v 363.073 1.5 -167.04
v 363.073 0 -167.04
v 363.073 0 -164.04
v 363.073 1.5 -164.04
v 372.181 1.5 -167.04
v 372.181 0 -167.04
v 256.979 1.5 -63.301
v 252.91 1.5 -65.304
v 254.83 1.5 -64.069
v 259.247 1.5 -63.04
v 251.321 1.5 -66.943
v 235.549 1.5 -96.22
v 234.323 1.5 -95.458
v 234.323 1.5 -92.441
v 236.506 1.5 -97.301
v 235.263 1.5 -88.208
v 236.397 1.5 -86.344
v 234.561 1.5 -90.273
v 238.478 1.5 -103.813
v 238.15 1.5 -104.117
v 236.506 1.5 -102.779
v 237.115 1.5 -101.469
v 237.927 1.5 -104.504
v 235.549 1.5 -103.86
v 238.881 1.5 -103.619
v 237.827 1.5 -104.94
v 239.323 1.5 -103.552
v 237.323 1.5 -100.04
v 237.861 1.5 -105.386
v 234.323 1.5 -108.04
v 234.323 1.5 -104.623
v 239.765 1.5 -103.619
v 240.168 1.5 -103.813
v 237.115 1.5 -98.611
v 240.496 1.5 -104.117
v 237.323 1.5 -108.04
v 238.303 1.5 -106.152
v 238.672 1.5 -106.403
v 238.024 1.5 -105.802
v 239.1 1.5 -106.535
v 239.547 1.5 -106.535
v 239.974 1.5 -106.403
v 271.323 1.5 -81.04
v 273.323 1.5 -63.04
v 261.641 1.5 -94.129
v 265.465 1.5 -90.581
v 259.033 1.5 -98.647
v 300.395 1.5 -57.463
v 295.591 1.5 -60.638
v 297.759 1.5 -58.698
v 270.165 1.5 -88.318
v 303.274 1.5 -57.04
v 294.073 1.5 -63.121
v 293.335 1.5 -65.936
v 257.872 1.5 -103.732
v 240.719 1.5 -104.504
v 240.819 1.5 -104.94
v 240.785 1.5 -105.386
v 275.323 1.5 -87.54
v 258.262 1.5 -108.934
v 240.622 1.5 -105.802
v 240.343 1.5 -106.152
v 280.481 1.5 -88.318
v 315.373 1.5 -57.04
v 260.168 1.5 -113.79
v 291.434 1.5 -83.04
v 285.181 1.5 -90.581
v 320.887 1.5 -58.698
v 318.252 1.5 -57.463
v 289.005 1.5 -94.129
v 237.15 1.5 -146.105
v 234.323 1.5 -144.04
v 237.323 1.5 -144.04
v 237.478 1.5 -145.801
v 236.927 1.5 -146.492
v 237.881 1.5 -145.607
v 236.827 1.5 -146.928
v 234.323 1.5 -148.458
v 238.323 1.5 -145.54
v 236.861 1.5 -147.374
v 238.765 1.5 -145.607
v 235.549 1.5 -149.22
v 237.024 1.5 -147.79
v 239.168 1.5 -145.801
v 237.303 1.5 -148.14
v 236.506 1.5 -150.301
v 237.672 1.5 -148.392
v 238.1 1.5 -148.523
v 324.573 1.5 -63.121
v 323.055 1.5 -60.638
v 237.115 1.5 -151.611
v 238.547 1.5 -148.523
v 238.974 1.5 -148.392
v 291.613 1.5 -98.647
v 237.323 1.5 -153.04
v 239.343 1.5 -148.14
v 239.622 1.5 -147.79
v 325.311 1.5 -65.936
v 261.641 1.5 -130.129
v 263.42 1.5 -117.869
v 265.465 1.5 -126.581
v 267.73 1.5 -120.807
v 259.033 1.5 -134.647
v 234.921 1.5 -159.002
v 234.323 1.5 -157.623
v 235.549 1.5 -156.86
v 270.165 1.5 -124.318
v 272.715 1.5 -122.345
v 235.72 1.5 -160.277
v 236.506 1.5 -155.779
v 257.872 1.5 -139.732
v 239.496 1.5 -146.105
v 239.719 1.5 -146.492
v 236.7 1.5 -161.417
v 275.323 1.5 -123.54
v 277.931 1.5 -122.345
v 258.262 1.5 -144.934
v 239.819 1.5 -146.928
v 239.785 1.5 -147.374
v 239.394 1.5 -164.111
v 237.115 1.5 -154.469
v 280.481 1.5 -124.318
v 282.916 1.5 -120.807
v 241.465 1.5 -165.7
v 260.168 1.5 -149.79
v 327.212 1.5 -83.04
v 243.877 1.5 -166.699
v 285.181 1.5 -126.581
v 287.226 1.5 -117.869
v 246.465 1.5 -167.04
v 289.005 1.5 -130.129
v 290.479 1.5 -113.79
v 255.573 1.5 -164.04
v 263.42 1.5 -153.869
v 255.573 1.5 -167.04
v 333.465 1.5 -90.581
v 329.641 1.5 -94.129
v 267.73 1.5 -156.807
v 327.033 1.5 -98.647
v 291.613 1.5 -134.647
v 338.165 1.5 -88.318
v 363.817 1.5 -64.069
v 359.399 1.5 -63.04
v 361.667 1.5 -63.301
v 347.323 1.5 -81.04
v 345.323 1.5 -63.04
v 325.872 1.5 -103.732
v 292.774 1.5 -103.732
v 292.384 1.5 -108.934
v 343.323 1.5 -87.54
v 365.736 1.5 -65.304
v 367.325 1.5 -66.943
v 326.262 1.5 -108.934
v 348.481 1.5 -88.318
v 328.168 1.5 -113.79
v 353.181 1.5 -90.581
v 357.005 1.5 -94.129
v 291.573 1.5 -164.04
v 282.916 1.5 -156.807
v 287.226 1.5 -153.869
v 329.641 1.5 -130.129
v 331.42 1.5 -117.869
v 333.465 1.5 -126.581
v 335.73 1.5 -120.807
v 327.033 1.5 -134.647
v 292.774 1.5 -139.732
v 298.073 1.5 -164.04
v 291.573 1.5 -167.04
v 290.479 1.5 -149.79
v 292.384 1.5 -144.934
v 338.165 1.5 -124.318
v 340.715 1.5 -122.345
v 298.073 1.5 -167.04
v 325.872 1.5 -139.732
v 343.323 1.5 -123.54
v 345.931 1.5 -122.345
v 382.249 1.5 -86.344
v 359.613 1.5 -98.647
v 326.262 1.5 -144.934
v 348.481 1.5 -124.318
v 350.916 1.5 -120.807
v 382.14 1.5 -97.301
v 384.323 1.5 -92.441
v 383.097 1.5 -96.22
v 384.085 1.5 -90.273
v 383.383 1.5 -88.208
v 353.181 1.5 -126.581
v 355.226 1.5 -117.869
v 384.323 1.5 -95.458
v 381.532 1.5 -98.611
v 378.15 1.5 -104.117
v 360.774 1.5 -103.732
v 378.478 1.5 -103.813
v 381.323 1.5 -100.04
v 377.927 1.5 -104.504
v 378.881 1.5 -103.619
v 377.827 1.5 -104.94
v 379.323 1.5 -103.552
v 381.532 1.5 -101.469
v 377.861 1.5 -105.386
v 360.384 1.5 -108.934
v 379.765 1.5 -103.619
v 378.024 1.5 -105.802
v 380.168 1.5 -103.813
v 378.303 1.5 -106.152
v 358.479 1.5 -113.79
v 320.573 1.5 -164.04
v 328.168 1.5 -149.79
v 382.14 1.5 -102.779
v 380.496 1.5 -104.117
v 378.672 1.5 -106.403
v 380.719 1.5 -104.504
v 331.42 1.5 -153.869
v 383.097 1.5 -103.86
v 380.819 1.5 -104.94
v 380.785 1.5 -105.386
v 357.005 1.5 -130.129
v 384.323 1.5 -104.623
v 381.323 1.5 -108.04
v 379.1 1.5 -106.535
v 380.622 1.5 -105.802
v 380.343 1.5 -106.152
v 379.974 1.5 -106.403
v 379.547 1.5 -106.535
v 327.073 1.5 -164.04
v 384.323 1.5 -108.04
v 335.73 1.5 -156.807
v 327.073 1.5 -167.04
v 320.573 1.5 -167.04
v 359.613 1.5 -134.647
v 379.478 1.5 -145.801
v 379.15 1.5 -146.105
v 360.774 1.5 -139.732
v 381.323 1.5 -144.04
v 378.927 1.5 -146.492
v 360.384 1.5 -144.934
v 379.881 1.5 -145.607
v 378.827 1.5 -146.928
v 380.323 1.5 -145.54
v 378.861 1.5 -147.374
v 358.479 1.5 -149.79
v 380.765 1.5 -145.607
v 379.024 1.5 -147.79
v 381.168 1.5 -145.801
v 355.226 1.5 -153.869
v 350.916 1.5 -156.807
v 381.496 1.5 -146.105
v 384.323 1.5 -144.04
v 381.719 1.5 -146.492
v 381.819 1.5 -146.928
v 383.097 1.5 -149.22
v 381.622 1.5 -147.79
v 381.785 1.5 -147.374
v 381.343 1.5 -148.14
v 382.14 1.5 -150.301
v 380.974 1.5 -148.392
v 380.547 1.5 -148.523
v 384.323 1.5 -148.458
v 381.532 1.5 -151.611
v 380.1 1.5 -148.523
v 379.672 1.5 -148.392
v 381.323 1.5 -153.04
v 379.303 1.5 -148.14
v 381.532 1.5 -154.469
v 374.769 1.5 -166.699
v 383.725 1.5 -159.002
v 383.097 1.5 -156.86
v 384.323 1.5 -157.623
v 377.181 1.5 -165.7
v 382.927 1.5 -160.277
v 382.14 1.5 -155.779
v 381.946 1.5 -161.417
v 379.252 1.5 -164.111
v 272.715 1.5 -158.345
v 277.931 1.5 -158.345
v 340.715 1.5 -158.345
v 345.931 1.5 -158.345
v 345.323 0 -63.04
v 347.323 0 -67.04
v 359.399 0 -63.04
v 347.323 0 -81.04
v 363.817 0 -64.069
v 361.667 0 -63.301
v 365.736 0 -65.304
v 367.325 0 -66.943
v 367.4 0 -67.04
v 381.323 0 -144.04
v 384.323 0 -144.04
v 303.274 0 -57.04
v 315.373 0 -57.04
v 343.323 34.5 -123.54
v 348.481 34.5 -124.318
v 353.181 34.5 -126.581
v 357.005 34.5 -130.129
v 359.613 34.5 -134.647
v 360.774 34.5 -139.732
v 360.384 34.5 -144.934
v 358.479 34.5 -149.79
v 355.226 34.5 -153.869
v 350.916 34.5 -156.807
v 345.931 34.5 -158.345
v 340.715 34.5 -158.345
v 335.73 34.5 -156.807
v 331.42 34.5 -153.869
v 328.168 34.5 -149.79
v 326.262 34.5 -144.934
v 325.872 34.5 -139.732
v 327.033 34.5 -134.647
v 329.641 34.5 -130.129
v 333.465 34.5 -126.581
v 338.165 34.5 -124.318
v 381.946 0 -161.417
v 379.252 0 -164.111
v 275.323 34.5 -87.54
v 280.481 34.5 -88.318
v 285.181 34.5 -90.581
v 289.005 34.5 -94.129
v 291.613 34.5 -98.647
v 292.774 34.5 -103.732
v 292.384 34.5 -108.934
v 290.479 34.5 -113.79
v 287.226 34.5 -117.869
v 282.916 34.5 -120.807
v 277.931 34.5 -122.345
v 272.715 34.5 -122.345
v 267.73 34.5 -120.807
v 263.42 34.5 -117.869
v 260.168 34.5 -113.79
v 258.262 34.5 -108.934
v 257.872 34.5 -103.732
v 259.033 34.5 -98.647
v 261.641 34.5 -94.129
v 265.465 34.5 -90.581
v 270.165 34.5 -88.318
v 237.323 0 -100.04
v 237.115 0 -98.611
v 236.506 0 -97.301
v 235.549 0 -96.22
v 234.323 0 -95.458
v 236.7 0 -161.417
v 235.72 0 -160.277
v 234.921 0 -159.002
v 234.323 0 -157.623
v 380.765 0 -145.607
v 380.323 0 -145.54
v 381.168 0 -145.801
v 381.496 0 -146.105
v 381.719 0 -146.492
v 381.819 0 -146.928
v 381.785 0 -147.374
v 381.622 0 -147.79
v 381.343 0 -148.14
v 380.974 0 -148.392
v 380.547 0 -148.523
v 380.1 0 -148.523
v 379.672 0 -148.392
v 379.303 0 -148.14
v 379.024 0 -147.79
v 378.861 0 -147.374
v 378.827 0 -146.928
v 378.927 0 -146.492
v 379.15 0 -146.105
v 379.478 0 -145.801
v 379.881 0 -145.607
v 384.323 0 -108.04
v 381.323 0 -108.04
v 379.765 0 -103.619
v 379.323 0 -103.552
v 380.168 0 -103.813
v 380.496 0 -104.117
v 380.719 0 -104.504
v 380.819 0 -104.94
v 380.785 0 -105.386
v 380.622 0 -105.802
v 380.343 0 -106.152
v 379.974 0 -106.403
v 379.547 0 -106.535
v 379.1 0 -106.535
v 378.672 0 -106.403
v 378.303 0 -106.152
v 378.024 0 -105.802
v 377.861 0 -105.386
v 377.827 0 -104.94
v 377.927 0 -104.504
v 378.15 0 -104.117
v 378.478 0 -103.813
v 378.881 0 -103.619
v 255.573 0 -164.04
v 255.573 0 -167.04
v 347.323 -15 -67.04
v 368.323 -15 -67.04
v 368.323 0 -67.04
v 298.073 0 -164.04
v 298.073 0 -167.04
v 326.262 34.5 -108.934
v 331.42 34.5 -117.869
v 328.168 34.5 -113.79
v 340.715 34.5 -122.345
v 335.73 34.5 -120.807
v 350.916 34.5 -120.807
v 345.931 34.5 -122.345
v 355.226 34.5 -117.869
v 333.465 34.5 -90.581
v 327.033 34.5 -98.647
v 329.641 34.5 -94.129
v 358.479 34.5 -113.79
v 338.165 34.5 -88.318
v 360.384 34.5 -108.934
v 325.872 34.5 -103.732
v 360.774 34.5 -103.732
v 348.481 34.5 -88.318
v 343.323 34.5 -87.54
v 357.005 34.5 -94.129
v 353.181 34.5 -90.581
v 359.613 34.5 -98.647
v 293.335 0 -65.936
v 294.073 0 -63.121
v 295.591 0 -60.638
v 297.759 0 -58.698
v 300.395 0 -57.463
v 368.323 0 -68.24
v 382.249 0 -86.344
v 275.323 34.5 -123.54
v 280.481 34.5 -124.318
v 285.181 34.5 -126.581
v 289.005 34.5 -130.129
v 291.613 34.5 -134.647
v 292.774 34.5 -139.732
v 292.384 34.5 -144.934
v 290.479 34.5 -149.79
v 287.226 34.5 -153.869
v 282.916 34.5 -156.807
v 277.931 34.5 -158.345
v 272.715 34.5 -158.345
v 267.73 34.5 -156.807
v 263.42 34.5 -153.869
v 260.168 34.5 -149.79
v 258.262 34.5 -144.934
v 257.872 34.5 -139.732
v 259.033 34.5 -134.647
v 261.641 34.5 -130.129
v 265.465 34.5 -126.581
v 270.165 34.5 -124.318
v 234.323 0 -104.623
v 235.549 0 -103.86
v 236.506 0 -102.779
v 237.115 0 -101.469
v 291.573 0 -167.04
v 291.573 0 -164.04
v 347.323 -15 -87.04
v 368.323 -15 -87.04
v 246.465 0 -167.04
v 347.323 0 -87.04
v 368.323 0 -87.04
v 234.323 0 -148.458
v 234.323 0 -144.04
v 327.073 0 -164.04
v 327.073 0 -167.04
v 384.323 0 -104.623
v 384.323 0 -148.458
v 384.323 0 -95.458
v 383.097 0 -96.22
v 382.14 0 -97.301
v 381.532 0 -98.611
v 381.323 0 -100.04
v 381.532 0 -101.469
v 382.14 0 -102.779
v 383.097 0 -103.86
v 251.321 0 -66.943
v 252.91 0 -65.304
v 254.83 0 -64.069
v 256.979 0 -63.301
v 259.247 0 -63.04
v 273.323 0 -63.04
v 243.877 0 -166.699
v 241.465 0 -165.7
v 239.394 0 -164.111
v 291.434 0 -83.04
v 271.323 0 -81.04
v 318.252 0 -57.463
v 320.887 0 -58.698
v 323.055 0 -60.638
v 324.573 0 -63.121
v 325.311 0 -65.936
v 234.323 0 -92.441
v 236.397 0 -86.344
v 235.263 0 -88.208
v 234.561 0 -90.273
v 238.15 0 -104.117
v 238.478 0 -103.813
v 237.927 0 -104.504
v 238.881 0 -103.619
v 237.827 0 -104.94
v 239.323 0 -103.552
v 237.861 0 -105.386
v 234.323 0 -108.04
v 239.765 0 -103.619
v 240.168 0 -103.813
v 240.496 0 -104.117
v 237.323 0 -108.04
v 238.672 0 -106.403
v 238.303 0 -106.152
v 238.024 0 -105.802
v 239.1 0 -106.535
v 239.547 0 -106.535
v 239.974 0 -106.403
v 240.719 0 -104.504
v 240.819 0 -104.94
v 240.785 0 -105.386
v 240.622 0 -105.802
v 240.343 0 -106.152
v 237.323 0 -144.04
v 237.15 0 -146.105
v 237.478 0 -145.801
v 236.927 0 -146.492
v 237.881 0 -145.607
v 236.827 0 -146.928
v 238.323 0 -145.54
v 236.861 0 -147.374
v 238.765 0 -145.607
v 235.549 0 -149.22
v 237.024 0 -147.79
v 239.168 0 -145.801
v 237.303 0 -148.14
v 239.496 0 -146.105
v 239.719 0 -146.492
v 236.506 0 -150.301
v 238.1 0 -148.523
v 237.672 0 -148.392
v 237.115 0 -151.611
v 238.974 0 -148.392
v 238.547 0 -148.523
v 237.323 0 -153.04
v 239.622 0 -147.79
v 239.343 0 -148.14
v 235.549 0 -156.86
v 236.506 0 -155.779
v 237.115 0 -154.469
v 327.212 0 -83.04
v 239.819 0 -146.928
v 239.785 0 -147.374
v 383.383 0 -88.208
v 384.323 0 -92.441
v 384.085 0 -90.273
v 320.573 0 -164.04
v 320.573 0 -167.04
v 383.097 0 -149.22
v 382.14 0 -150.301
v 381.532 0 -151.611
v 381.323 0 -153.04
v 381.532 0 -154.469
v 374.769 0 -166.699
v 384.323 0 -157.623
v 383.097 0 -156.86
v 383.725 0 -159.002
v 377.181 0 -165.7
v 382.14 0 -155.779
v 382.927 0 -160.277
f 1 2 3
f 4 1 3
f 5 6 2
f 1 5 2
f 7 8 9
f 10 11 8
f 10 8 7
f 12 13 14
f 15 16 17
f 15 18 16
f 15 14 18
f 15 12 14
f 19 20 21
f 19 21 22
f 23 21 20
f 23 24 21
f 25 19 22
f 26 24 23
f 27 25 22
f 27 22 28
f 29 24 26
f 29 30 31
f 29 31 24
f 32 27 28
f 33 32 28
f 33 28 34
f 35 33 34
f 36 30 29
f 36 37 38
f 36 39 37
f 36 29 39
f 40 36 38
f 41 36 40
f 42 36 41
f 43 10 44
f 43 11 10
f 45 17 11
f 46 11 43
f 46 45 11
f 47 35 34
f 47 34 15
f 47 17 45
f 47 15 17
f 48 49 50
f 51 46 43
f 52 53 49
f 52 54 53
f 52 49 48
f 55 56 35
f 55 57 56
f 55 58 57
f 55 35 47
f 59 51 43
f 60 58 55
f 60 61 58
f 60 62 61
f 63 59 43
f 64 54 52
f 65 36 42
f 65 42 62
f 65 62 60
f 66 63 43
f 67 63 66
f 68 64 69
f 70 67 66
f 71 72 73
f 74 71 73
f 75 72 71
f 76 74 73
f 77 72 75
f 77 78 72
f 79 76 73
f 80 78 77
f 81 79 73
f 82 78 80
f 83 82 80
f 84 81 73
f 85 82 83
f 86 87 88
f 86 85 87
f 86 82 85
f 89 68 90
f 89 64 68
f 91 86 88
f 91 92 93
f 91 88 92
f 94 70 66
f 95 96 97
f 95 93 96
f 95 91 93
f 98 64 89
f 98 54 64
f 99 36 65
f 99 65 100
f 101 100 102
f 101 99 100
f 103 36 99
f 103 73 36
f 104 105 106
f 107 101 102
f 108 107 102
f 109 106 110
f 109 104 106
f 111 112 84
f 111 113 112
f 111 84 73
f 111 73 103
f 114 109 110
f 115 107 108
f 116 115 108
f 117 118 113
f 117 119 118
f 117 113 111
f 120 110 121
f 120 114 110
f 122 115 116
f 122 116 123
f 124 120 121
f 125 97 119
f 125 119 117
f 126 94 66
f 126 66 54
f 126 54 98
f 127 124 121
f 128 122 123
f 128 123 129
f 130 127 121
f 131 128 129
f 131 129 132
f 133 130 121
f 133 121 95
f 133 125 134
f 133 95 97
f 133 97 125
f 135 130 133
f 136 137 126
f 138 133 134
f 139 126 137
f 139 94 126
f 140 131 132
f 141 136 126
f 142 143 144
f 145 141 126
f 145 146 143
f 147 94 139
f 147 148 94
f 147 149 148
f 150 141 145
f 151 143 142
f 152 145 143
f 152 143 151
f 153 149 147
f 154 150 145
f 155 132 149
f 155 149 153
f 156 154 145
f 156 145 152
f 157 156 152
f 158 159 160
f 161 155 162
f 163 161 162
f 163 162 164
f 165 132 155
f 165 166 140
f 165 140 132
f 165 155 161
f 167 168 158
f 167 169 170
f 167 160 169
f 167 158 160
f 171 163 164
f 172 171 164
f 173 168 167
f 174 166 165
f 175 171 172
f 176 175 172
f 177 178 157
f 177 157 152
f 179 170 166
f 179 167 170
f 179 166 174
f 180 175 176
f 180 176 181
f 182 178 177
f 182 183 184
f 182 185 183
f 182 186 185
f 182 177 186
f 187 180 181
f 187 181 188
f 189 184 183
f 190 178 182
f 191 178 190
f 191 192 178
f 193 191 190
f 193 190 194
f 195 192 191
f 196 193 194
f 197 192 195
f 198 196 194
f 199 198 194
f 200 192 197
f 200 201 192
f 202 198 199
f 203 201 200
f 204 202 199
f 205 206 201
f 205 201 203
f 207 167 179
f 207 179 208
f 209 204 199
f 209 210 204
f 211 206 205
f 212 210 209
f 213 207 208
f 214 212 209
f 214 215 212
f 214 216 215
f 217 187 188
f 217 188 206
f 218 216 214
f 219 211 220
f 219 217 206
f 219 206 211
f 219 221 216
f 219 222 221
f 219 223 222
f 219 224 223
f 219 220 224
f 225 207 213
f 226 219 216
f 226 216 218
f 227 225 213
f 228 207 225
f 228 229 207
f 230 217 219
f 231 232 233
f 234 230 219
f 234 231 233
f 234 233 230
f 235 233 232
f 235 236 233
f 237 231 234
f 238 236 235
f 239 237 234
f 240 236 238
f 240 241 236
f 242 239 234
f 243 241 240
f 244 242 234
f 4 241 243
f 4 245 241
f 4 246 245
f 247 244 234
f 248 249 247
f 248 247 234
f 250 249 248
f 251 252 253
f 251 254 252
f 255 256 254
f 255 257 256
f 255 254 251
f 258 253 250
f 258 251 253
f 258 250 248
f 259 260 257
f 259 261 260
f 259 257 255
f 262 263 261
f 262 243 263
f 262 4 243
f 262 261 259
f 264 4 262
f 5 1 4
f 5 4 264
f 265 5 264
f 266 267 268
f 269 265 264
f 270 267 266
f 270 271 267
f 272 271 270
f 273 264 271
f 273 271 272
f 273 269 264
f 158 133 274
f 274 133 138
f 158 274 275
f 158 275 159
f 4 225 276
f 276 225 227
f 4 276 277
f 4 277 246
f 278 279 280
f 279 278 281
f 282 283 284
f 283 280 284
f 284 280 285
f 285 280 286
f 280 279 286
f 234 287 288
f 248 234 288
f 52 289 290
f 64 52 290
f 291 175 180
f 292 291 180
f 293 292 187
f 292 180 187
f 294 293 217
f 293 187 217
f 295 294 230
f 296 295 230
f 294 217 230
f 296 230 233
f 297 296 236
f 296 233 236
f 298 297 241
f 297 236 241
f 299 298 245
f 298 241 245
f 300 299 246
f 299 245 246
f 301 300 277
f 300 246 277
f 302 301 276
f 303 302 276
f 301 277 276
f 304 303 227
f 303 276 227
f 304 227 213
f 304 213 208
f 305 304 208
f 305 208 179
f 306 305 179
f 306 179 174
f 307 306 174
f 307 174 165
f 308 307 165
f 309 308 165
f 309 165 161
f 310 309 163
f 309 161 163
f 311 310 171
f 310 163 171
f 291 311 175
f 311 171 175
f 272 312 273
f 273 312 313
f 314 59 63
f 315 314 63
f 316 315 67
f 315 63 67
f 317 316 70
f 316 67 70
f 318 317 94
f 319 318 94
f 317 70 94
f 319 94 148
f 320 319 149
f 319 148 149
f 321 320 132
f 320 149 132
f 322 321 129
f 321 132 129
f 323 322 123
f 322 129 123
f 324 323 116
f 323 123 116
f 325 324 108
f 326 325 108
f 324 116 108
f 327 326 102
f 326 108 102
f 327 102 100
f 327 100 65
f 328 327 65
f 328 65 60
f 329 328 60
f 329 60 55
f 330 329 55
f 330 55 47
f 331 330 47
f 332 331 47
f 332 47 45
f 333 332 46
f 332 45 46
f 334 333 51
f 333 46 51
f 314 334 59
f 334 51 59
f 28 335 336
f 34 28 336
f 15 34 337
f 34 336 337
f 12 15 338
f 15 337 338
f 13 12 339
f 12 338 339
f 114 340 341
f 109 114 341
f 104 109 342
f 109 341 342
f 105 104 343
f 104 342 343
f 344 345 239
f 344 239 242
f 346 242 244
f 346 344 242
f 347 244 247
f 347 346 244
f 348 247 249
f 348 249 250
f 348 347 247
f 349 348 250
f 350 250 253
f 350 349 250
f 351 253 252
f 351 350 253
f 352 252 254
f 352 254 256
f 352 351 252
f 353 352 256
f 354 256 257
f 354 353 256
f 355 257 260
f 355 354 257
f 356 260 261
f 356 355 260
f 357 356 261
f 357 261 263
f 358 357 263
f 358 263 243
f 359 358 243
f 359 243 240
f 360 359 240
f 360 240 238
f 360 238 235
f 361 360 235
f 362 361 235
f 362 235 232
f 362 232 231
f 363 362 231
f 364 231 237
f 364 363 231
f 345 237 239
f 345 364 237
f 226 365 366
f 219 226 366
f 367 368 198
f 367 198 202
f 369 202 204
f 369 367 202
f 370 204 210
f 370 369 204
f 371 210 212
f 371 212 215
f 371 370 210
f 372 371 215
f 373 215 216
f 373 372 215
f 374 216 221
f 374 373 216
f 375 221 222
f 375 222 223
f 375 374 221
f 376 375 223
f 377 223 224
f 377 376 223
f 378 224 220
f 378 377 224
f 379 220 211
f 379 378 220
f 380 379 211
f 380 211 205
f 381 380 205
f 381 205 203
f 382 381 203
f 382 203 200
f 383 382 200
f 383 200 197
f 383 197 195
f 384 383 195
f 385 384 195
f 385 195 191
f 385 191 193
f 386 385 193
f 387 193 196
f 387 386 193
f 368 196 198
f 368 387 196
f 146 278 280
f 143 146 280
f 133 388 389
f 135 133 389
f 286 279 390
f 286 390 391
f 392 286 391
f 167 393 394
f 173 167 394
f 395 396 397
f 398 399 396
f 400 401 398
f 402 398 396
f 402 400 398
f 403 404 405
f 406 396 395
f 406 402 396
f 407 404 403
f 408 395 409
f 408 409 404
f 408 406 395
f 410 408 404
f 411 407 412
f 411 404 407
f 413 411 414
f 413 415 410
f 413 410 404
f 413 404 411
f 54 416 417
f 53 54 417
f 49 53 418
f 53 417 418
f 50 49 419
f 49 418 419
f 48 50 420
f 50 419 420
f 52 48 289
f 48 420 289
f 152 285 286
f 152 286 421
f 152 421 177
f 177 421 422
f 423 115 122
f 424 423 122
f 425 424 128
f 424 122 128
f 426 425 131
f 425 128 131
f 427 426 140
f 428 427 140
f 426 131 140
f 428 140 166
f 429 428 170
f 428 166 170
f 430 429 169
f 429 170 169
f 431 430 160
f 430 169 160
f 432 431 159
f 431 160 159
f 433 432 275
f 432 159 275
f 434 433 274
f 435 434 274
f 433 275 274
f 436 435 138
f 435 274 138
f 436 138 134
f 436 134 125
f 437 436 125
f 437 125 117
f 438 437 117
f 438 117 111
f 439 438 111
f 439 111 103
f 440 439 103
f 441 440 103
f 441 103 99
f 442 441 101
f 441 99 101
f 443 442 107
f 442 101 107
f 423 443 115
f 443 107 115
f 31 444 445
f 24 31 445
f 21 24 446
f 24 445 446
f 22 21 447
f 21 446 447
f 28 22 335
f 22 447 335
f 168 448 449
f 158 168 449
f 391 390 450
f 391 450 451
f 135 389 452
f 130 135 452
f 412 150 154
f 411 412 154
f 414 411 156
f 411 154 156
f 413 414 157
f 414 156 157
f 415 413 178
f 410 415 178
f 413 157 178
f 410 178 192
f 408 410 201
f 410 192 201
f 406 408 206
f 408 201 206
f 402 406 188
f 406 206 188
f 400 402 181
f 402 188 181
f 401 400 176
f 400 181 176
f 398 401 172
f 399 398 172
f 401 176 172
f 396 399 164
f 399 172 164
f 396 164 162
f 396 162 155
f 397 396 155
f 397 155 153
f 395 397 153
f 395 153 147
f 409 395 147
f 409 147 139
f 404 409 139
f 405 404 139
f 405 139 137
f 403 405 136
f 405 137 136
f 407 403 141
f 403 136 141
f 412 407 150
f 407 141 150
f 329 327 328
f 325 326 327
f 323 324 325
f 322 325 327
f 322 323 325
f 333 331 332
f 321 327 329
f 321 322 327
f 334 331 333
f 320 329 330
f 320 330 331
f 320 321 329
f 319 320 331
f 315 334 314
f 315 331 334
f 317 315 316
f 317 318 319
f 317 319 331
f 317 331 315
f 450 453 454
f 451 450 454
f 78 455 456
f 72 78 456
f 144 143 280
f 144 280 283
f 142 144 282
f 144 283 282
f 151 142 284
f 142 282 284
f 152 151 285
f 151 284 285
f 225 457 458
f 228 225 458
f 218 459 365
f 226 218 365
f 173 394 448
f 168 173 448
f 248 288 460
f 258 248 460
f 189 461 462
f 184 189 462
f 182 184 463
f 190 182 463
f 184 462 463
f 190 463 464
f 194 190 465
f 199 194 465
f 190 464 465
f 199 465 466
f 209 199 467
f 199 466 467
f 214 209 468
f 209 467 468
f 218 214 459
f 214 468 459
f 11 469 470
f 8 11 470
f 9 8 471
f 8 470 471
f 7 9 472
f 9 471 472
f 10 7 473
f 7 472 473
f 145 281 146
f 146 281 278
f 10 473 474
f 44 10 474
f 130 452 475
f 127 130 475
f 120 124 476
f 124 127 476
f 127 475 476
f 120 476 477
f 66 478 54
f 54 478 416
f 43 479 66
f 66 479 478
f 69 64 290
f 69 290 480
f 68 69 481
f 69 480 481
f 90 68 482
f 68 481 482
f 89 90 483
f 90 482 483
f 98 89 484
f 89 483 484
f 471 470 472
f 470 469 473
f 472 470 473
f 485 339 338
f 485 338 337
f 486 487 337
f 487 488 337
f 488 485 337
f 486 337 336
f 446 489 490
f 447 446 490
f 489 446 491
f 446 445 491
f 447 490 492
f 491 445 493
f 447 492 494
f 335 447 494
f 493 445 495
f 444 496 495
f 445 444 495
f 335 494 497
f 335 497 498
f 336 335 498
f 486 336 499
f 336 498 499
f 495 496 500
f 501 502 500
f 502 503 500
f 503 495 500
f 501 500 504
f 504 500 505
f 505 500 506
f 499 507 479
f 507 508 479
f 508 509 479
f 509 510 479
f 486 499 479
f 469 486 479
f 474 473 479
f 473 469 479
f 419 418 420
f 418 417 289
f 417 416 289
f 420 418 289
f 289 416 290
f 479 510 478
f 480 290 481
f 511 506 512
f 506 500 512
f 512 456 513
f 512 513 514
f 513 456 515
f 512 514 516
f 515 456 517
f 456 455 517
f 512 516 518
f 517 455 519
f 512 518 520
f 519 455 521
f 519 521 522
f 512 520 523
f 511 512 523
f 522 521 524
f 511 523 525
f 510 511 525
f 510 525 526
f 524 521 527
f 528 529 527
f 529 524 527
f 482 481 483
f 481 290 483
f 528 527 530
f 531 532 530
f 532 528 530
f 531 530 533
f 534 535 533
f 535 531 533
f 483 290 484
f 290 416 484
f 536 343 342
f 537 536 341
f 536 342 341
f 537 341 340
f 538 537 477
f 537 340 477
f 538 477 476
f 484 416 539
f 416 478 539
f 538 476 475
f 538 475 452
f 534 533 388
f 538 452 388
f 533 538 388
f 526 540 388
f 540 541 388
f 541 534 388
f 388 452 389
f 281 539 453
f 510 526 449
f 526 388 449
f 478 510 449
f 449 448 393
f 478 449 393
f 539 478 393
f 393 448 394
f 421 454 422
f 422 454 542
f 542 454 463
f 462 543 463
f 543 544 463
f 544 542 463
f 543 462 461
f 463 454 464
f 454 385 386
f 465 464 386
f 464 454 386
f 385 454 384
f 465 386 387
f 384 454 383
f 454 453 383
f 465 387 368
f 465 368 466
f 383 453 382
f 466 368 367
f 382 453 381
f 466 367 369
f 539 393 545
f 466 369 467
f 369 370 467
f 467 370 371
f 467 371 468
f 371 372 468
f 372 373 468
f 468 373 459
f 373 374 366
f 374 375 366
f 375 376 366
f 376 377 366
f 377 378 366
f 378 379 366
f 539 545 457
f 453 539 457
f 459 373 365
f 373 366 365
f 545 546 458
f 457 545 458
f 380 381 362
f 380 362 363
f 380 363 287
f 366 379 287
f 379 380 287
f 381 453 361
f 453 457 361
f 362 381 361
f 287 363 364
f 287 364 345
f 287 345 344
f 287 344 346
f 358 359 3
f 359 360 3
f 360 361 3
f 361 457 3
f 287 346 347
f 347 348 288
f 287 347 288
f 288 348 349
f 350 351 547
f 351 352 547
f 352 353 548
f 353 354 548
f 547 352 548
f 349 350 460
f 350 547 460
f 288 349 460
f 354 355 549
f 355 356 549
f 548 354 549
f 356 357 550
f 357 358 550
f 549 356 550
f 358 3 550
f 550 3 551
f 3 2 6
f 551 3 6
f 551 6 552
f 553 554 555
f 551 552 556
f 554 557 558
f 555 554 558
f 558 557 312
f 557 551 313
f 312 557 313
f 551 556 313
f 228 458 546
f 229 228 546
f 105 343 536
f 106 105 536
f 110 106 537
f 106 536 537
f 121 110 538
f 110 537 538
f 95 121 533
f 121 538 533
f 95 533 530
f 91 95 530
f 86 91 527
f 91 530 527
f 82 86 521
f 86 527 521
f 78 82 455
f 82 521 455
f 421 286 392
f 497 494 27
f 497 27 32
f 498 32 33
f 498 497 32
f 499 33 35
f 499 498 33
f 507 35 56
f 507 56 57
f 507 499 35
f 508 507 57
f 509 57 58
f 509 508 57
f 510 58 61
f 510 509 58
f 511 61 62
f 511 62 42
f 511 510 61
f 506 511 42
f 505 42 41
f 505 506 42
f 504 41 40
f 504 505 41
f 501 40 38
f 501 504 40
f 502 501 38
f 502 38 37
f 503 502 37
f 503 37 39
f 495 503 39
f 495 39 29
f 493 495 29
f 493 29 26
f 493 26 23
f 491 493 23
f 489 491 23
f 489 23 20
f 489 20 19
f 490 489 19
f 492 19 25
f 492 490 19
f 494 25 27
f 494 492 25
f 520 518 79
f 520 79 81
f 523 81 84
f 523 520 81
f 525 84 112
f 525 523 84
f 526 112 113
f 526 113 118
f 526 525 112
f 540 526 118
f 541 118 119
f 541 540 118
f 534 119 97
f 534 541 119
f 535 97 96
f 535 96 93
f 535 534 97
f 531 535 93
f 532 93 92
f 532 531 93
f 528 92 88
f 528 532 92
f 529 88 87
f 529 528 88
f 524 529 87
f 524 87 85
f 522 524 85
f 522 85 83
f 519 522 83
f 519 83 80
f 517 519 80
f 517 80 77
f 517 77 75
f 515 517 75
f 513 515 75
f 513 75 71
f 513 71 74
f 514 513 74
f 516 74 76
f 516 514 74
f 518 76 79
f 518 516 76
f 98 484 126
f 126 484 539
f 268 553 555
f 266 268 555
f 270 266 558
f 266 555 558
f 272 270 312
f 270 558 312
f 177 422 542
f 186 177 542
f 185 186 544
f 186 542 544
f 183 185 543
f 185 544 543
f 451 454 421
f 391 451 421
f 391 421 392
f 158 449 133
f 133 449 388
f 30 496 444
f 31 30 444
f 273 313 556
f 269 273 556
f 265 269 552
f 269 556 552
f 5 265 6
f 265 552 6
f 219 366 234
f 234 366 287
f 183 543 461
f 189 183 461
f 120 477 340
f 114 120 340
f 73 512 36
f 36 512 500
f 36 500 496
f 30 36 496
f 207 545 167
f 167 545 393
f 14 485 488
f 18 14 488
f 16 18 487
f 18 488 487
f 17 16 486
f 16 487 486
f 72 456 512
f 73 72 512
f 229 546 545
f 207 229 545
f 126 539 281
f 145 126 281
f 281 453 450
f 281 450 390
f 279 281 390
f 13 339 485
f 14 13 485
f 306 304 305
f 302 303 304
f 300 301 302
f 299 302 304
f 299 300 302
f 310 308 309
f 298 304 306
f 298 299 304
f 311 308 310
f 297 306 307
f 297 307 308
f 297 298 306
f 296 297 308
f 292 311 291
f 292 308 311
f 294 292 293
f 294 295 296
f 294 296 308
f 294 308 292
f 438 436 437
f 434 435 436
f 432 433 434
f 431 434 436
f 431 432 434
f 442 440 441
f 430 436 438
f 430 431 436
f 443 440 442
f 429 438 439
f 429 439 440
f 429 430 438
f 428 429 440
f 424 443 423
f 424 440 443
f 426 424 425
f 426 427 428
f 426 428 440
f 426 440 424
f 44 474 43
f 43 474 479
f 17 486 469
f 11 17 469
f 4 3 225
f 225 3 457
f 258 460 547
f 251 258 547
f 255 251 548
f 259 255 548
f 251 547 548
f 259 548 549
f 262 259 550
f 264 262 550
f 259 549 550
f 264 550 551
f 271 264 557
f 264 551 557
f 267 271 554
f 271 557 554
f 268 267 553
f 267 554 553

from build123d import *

# Parameters (mm, degrees)
SKETCH_2_R      = 1.5
EXTRUDE_1_DEPTH = 1.5
SKETCH_3_R      = 17.5
EXTRUDE_2_DEPTH = 33
SKETCH_4_W      = 21
SKETCH_4_H      = 20
EXTRUDE_3_DEPTH = 15
FILLET_1_R      = 10


with BuildPart() as part:
    # 草图2 → 凸台-拉伸1 (new body)
    with BuildSketch(Plane(origin=(0, 0, 0), x_dir=(1, 0, 0), z_dir=(0, 1, 0))):
        with BuildLine():
            Line((255.573084798, 167.040097328), (242.323084798, 167.040097328))
            Line((242.323084798, 167.040097328), (234.323084798, 159.040097328))
            Line((234.323084798, 159.040097328), (234.323084798, 157.622673023))
            ThreePointArc((234.323084798, 157.622673023), (236.506384931, 155.778710115), (237.323084798, 153.040097328))
            ThreePointArc((237.323084798, 153.040097328), (236.506384931, 150.30148454), (234.323084798, 148.457521633))
            Line((234.323084798, 148.457521633), (234.323084798, 144.040097328))
            Line((234.323084798, 144.040097328), (237.323084798, 144.040097328))
            Line((237.323084798, 144.040097328), (237.323084798, 108.040097328))
            Line((237.323084798, 108.040097328), (234.323084798, 108.040097328))
            Line((234.323084798, 108.040097328), (234.323084798, 104.622673023))
            ThreePointArc((234.323084798, 104.622673023), (236.506384931, 102.778710115), (237.323084798, 100.040097328))
            ThreePointArc((237.323084798, 100.040097328), (236.506384931, 97.30148454), (234.323084798, 95.457521633))
            Line((234.323084798, 95.457521633), (234.323084798, 89.040097328))
            Line((234.323084798, 89.040097328), (254.323084798, 63.040097328))
            Line((254.323084798, 63.040097328), (273.323084798, 63.040097328))
            Line((273.323084798, 63.040097328), (271.323084798, 81.040097328))
            Line((271.323084798, 81.040097328), (291.434195909, 83.040097328))
            Line((291.434195909, 83.040097328), (294.323084798, 57.040097328))
            Line((294.323084798, 57.040097328), (324.323084798, 57.040097328))
            Line((324.323084798, 57.040097328), (327.211973687, 83.040097328))
            Line((327.211973687, 83.040097328), (347.323084798, 81.040097328))
            Line((347.323084798, 81.040097328), (345.323084798, 63.040097328))
            Line((345.323084798, 63.040097328), (364.323084798, 63.040097328))
            Line((364.323084798, 63.040097328), (384.323084798, 89.040097328))
            Line((384.323084798, 89.040097328), (384.323084798, 95.457521633))
            ThreePointArc((384.323084798, 95.457521633), (381.323084798, 100.040097328), (384.323084798, 104.622673023))
            Line((384.323084798, 104.622673023), (384.323084798, 108.040097328))
            Line((384.323084798, 108.040097328), (381.323084798, 108.040097328))
            Line((381.323084798, 108.040097328), (381.323084798, 144.040097328))
            Line((381.323084798, 144.040097328), (384.323084798, 144.040097328))
            Line((384.323084798, 144.040097328), (384.323084798, 148.457521633))
            ThreePointArc((384.323084798, 148.457521633), (381.323084798, 153.040097328), (384.323084798, 157.622673023))
            Line((384.323084798, 157.622673023), (384.323084798, 159.040097328))
            Line((384.323084798, 159.040097328), (376.323084798, 167.040097328))
            Line((376.323084798, 167.040097328), (363.073084798, 167.040097328))
            Line((363.073084798, 167.040097328), (363.073084798, 164.040097328))
            Line((363.073084798, 164.040097328), (327.073084798, 164.040097328))
            Line((327.073084798, 164.040097328), (327.073084798, 167.040097328))
            Line((327.073084798, 167.040097328), (320.573084798, 167.040097328))
            Line((320.573084798, 167.040097328), (320.573084798, 164.040097328))
            Line((320.573084798, 164.040097328), (298.073084798, 164.040097328))
            Line((298.073084798, 164.040097328), (298.073084798, 167.040097328))
            Line((298.073084798, 167.040097328), (291.573084798, 167.040097328))
            Line((291.573084798, 167.040097328), (291.573084798, 164.040097328))
            Line((291.573084798, 164.040097328), (255.573084798, 164.040097328))
            Line((255.573084798, 164.040097328), (255.573084798, 167.040097328))
        make_face()
        with Locations(Location((239.323084798, 105.052003777, 0), (0, 0, 270))):
            Circle(SKETCH_2_R, mode=Mode.SUBTRACT)
        with Locations(Location((379.323084798, 105.052003777, 0), (0, 0, 270))):
            Circle(SKETCH_2_R, mode=Mode.SUBTRACT)
        with Locations(Location((238.323084798, 147.040097328, 0), (0, 0, 270))):
            Circle(SKETCH_2_R, mode=Mode.SUBTRACT)
        with Locations(Location((380.323084798, 147.040097328, 0), (0, 0, 270))):
            Circle(SKETCH_2_R, mode=Mode.SUBTRACT)
    extrude(amount=EXTRUDE_1_DEPTH)

    # 草图3 → 凸台-拉伸2 (add)
    with BuildSketch(Plane(origin=(0, 1.5, 0), x_dir=(1, 0, 0), z_dir=(0, 1, 0))):
        with Locations(Location((275.323084798, 141.040097328, 0), (0, 0, 270))):
            Circle(SKETCH_3_R)
        with Locations(Location((343.323084798, 141.040097328, 0), (0, 0, 270))):
            Circle(SKETCH_3_R)
        with Locations(Location((275.323084798, 105.040097328, 0), (0, 0, 270))):
            Circle(SKETCH_3_R)
        with Locations(Location((343.323084798, 105.040097328, 0), (0, 0, 270))):
            Circle(SKETCH_3_R)
    extrude(amount=EXTRUDE_2_DEPTH)

    # 草图4 → 凸台-拉伸3 (add)
    with BuildSketch(Plane.XZ):
        with Locations((357.823084798, -77.040097328)):
            Rectangle(SKETCH_4_W, SKETCH_4_H)
    extrude(amount=EXTRUDE_3_DEPTH)

    # 圆角1
    # the kernel refuses this fillet: 10 mm, written as the material it takes off along each edge
    with BuildSketch(Plane(origin=(234.323084798, -8.403282896, -159.040097328), x_dir=(0, 0, 1), z_dir=(0, 1, 0))) as fillet_1_piece_1:
        with BuildLine():
            CenterArc((4.694260484, 9.44787514), FILLET_1_R, 225, 25.871759313)
            Line((-2.376807328, 2.376807328), (-2.518228684, 2.235385972))
            Line((-2.518228684, 2.235385972), (-0.141421356, -0.141421356))
            Line((-0.141421356, -0.141421356), (0, -0.2))
            ThreePointArc((0, -0.2), (0.708712153, -0.2), (1.351887581, -0.188957503))
            Line((1.351887581, -0.188957503), (1.417424305, 0))
        make_face()
    extrude(amount=18.306565791, mode=Mode.SUBTRACT)
    with BuildSketch(Plane(origin=(242.323084798, -10.355339059, -167.040097328), x_dir=(-0.7071067811865476, 0, 0.7071067811865476), z_dir=(0, 1, 0)), Plane(origin=(376.323084798, -10.355339059, -167.040097328), x_dir=(-1, 0, 0), z_dir=(0, 1, 0))) as fillet_1_piece_2:
        with BuildLine():
            CenterArc((FILLET_1_R * 0.414213562373, FILLET_1_R), FILLET_1_R, 225, 45)
            Line((-FILLET_1_R * 0.292893218813, FILLET_1_R * 0.292893218813), (-FILLET_1_R * 0.307035354437, FILLET_1_R * 0.27875108319))
            Line((-FILLET_1_R * 0.307035354437, FILLET_1_R * 0.27875108319), (-FILLET_1_R * 0.00828427124746, -FILLET_1_R * 0.02))
            Line((-FILLET_1_R * 0.00828427124746, -FILLET_1_R * 0.02), (FILLET_1_R * 0.414213562373, -FILLET_1_R * 0.02))
            Line((FILLET_1_R * 0.414213562373, -FILLET_1_R * 0.02), (FILLET_1_R * 0.414213562373, 0))
        make_face()
    extrude(amount=22.210678119, mode=Mode.SUBTRACT)
    with BuildSketch(Plane(origin=(384.323084798, -8.403282896, -159.040097328), x_dir=(-0.7071067811865475, 0, -0.7071067811865475), z_dir=(0, 1, 0))) as fillet_1_piece_3:
        with BuildLine():
            CenterArc((3.361313158, 10), FILLET_1_R, 244.128240687, 25.871759313)
            Line((-1.002270338, 1.002270338), (-1.089542008, 0.822315745))
            ThreePointArc((-1.089542008, 0.822315745), (-0.642556525, 0.359713813), (-0.141421356, -0.141421356))
            Line((-0.141421356, -0.141421356), (0, -0.2))
            Line((0, -0.2), (3.361313158, -0.2))
            Line((3.361313158, -0.2), (3.361313158, 0))
        make_face()
    extrude(amount=18.306565791, mode=Mode.SUBTRACT)
    with BuildSketch(Plane(origin=(384.323084798, -8.503048667, -89.040097328), x_dir=(0, 0, -1), z_dir=(0, 1, 0)), Plane(origin=(234.323084798, -8.503048667, -89.040097328), x_dir=(0.6097107608496891, 0, 0.7926239891046025), z_dir=(0, 1, 0))) as fillet_1_piece_4:
        with BuildLine():
            CenterArc((FILLET_1_R * 0.340121946686, FILLET_1_R), FILLET_1_R, 232.431407971, 37.568592029)
            Line((-FILLET_1_R * 0.269588814164, FILLET_1_R * 0.207376010895), (-FILLET_1_R * 0.281783029381, FILLET_1_R * 0.191523531113))
            Line((-FILLET_1_R * 0.281783029381, FILLET_1_R * 0.191523531113), (-FILLET_1_R * 0.00680243893371, -FILLET_1_R * 0.02))
            Line((-FILLET_1_R * 0.00680243893371, -FILLET_1_R * 0.02), (FILLET_1_R * 0.340121946686, -FILLET_1_R * 0.02))
            Line((FILLET_1_R * 0.340121946686, -FILLET_1_R * 0.02), (FILLET_1_R * 0.340121946686, 0))
        make_face()
    extrude(amount=18.506097334, mode=Mode.SUBTRACT)
    with BuildSketch(Plane(origin=(364.323084798, -12.310037436, -63.040097328), x_dir=(0.6097107608496888, 0, -0.792623989104603), z_dir=(0, 1, 0)), Plane(origin=(254.323084798, -12.310037436, -63.040097328), x_dir=(1, 0, 0), z_dir=(0, 1, 0))) as fillet_1_piece_5:
        with BuildLine():
            CenterArc((FILLET_1_R * 0.492401497451, FILLET_1_R), FILLET_1_R, 217.568592029, 52.431407971)
            Line((-FILLET_1_R * 0.300222491654, FILLET_1_R * 0.39028923915), (-FILLET_1_R * 0.316074971436, FILLET_1_R * 0.378095023933))
            Line((-FILLET_1_R * 0.316074971436, FILLET_1_R * 0.378095023933), (-FILLET_1_R * 0.00984802994901, -FILLET_1_R * 0.02))
            Line((-FILLET_1_R * 0.00984802994901, -FILLET_1_R * 0.02), (FILLET_1_R * 0.492401497451, -FILLET_1_R * 0.02))
            Line((FILLET_1_R * 0.492401497451, -FILLET_1_R * 0.02), (FILLET_1_R * 0.492401497451, 0))
        make_face()
    extrude(amount=26.120074873, mode=Mode.SUBTRACT)
    with BuildSketch(Plane(origin=(324.323084798, -22.376069828, -57.040097328), x_dir=(0.1104315260748475, 0, -0.9938837346736189), z_dir=(0, 1, 0)), Plane(origin=(294.323084798, -22.376069828, -57.040097328), x_dir=(1, 0, 0), z_dir=(0, 1, 0))) as fillet_1_piece_6:
        with BuildLine():
            CenterArc((FILLET_1_R * 0.895042793126, FILLET_1_R), FILLET_1_R, 186.340191746, 83.659808254)
            Line((-FILLET_1_R * 0.0988409415472, FILLET_1_R * 0.889568473925), (-FILLET_1_R * 0.118718616241, FILLET_1_R * 0.887359843404))
            Line((-FILLET_1_R * 0.118718616241, FILLET_1_R * 0.887359843404), (-FILLET_1_R * 0.0179008558625, -FILLET_1_R * 0.02))
            Line((-FILLET_1_R * 0.0179008558625, -FILLET_1_R * 0.02), (FILLET_1_R * 0.895042793126, -FILLET_1_R * 0.02))
            Line((FILLET_1_R * 0.895042793126, -FILLET_1_R * 0.02), (FILLET_1_R * 0.895042793126, 0))
        make_face()
    extrude(amount=46.252139656, mode=Mode.SUBTRACT)


solid = part.part
